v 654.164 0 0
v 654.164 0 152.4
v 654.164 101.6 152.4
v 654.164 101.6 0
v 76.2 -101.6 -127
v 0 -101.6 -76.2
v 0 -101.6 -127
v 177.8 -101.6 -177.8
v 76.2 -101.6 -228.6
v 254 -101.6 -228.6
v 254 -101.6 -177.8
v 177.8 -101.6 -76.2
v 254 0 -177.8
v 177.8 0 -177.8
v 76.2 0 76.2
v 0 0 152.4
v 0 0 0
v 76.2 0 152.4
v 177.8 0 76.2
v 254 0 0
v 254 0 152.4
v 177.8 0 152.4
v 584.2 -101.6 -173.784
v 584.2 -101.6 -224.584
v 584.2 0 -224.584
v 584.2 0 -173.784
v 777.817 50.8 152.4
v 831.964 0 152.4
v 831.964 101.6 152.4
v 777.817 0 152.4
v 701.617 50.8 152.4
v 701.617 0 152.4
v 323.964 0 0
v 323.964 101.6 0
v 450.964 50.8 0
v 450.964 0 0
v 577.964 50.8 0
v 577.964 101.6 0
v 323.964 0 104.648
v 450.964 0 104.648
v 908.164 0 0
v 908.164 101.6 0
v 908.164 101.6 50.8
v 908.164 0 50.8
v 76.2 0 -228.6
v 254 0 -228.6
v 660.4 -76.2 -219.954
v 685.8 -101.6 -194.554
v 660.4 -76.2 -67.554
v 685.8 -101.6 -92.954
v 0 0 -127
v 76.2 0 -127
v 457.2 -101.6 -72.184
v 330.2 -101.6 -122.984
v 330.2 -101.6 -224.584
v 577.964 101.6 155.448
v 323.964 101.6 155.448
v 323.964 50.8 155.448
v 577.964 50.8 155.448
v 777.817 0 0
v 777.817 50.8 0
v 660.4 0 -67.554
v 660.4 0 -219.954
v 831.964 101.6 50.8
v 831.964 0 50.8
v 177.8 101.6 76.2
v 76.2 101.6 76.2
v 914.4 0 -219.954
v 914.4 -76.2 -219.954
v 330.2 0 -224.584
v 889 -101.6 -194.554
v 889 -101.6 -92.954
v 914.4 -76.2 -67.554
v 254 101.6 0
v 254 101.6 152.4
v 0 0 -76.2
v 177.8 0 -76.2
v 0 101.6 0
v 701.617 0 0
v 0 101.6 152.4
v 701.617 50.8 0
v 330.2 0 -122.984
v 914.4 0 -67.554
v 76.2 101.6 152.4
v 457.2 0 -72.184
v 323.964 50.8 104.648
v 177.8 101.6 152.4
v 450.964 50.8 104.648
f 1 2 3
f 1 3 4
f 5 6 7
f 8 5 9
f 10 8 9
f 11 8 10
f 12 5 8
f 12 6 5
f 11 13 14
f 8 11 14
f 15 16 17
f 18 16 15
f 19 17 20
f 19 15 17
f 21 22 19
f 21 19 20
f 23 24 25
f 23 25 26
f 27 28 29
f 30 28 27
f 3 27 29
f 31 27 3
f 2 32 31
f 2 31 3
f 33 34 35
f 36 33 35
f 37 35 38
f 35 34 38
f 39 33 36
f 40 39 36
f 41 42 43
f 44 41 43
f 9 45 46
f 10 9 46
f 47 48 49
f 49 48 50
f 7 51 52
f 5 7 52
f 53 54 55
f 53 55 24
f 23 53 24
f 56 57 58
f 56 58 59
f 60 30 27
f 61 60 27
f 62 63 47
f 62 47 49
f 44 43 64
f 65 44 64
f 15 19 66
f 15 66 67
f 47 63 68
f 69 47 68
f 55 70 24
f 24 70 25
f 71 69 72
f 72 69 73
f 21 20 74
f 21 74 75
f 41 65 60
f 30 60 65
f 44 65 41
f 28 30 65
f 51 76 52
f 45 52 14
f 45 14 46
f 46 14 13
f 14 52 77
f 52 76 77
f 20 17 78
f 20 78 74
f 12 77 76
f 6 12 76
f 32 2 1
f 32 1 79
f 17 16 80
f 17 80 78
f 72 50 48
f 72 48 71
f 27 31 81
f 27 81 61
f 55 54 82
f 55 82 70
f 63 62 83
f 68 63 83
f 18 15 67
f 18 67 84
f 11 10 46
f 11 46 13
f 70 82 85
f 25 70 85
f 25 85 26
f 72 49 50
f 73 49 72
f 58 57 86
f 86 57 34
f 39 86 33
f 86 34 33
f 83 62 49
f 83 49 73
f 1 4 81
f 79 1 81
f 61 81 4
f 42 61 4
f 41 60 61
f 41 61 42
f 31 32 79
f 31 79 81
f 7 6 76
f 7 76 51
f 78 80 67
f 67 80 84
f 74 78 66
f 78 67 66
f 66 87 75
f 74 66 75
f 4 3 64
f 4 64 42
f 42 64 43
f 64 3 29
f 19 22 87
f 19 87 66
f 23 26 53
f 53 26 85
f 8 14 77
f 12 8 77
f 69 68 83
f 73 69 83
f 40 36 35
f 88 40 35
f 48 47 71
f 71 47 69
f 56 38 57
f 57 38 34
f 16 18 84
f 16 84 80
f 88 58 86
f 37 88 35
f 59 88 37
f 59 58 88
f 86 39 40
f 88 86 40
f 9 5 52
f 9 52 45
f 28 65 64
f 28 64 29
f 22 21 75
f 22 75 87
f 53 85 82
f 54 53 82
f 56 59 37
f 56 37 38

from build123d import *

# Parameters (mm, degrees)
F1_DEPTH   = 101.6
F3_DEPTH   = 155.448
F4_W       = 127
F4_H       = 35.615544
F5_DEPTH   = 50.8
F6_W       = 127
F6_H       = 50.8
F7_DEPTH   = 50.8
F9_DEPTH   = 101.6
F10_W      = 76.2
F10_H      = 50.8
F11_DEPTH  = 152.4
F13_DEPTH  = 101.6
F15_DEPTH  = 101.6
F16_W      = 254
F16_H      = 152.4
F17_DEPTH  = 101.6
F17_FACE_W = 254
F17_FACE_H = 152.4
F18_DEPTH  = 25.4
F19_SIZE   = 25.4


with BuildPart() as f1:
    # F0 (on Front) → F1 (new body)
    with BuildSketch(Plane.XZ):
        Polygon((0, 152.4), (0, 0), (254, 0), (254, 152.4), (177.8, 152.4), (177.8, 76.2), (76.2, 76.2), (76.2, 152.4), align=None)
    extrude(amount=-F1_DEPTH)


with BuildPart() as f3:
    # F2 (on Top) → F3 (new body)
    with BuildSketch(Plane.XY):
        Polygon((323.9641, 101.6), (323.9641, 0), (450.9641, 0), (450.9641, 50.8), (577.9641, 50.8), (577.9641, 101.6), align=None)
    extrude(amount=F3_DEPTH)

    # F4 (on face) → F5 (join)
    with BuildSketch(Plane.XZ):
        with Locations((387.4641, 137.640228)):
            Rectangle(F4_W, F4_H)
    extrude(amount=-F5_DEPTH)

    # F6 (on face) → F7 (cut)
    with BuildSketch(Plane.XZ):
        with Locations((387.4641, 130.048)):
            Rectangle(F6_W, F6_H)
    extrude(amount=-F7_DEPTH, mode=Mode.SUBTRACT)


with BuildPart() as f9:
    # F8 (on Front) → F9 (new body)
    with BuildSketch(Plane.XZ):
        Polygon((654.1641, 152.4), (654.1641, 0), (908.1641, 0), (908.1641, 50.8), (831.9641, 50.8), (831.9641, 152.4), align=None)
    extrude(amount=-F9_DEPTH)

    # F10 (on face) → F11 (cut)
    with BuildSketch(Plane.XY.offset(152.4)):
        with Locations((739.717122, 25.4)):
            Rectangle(F10_W, F10_H)
    extrude(amount=-F11_DEPTH, mode=Mode.SUBTRACT)


with BuildPart() as f13:
    # F12 (on Front) → F13 (new body)
    with BuildSketch(Plane.XZ):
        Polygon((177.8, -76.2), (0, -76.2), (0, -127), (76.2, -127), (76.2, -228.6), (254, -228.6), (254, -177.8), (177.8, -177.8), align=None)
    extrude(amount=F13_DEPTH)


with BuildPart() as f15:
    # F14 (on Front) → F15 (new body)
    with BuildSketch(Plane.XZ):
        Polygon((330.2, -122.984252), (330.2, -224.584252), (457.2, -224.584252), (457.2, -72.184252), align=None)
        Polygon((457.2, -72.184252), (457.2, -224.584252), (584.2, -224.584252), (584.2, -173.784252), align=None)
    extrude(amount=F15_DEPTH)


with BuildPart() as f17:
    # F16 (on Front) → F17 (new body)
    with BuildSketch(Plane.XZ):
        with Locations((787.4, -143.753507)):
            Rectangle(F16_W, F16_H)
    extrude(amount=F17_DEPTH)

    # F17_face (on face) → F18 (join)
    with BuildSketch(Plane(origin=(787.4, -101.6, -143.753507), x_dir=(1, 0, 0), z_dir=(0, -1, 0))):
        Rectangle(F17_FACE_W, F17_FACE_H)
    extrude(amount=-F18_DEPTH)

    # F19
    f19_edges = [f17.edges().sort_by_distance(p)[0] for p in [
        (660.4, -101.6, -143.753507),
        (787.4, -101.6, -219.953507),
        (914.4, -101.6, -143.753507),
        (787.4, -101.6, -67.553507),
    ]]
    chamfer(f19_edges, length=F19_SIZE)


solid = Compound([f1.part, f3.part, f9.part, f13.part, f15.part, f17.part])
